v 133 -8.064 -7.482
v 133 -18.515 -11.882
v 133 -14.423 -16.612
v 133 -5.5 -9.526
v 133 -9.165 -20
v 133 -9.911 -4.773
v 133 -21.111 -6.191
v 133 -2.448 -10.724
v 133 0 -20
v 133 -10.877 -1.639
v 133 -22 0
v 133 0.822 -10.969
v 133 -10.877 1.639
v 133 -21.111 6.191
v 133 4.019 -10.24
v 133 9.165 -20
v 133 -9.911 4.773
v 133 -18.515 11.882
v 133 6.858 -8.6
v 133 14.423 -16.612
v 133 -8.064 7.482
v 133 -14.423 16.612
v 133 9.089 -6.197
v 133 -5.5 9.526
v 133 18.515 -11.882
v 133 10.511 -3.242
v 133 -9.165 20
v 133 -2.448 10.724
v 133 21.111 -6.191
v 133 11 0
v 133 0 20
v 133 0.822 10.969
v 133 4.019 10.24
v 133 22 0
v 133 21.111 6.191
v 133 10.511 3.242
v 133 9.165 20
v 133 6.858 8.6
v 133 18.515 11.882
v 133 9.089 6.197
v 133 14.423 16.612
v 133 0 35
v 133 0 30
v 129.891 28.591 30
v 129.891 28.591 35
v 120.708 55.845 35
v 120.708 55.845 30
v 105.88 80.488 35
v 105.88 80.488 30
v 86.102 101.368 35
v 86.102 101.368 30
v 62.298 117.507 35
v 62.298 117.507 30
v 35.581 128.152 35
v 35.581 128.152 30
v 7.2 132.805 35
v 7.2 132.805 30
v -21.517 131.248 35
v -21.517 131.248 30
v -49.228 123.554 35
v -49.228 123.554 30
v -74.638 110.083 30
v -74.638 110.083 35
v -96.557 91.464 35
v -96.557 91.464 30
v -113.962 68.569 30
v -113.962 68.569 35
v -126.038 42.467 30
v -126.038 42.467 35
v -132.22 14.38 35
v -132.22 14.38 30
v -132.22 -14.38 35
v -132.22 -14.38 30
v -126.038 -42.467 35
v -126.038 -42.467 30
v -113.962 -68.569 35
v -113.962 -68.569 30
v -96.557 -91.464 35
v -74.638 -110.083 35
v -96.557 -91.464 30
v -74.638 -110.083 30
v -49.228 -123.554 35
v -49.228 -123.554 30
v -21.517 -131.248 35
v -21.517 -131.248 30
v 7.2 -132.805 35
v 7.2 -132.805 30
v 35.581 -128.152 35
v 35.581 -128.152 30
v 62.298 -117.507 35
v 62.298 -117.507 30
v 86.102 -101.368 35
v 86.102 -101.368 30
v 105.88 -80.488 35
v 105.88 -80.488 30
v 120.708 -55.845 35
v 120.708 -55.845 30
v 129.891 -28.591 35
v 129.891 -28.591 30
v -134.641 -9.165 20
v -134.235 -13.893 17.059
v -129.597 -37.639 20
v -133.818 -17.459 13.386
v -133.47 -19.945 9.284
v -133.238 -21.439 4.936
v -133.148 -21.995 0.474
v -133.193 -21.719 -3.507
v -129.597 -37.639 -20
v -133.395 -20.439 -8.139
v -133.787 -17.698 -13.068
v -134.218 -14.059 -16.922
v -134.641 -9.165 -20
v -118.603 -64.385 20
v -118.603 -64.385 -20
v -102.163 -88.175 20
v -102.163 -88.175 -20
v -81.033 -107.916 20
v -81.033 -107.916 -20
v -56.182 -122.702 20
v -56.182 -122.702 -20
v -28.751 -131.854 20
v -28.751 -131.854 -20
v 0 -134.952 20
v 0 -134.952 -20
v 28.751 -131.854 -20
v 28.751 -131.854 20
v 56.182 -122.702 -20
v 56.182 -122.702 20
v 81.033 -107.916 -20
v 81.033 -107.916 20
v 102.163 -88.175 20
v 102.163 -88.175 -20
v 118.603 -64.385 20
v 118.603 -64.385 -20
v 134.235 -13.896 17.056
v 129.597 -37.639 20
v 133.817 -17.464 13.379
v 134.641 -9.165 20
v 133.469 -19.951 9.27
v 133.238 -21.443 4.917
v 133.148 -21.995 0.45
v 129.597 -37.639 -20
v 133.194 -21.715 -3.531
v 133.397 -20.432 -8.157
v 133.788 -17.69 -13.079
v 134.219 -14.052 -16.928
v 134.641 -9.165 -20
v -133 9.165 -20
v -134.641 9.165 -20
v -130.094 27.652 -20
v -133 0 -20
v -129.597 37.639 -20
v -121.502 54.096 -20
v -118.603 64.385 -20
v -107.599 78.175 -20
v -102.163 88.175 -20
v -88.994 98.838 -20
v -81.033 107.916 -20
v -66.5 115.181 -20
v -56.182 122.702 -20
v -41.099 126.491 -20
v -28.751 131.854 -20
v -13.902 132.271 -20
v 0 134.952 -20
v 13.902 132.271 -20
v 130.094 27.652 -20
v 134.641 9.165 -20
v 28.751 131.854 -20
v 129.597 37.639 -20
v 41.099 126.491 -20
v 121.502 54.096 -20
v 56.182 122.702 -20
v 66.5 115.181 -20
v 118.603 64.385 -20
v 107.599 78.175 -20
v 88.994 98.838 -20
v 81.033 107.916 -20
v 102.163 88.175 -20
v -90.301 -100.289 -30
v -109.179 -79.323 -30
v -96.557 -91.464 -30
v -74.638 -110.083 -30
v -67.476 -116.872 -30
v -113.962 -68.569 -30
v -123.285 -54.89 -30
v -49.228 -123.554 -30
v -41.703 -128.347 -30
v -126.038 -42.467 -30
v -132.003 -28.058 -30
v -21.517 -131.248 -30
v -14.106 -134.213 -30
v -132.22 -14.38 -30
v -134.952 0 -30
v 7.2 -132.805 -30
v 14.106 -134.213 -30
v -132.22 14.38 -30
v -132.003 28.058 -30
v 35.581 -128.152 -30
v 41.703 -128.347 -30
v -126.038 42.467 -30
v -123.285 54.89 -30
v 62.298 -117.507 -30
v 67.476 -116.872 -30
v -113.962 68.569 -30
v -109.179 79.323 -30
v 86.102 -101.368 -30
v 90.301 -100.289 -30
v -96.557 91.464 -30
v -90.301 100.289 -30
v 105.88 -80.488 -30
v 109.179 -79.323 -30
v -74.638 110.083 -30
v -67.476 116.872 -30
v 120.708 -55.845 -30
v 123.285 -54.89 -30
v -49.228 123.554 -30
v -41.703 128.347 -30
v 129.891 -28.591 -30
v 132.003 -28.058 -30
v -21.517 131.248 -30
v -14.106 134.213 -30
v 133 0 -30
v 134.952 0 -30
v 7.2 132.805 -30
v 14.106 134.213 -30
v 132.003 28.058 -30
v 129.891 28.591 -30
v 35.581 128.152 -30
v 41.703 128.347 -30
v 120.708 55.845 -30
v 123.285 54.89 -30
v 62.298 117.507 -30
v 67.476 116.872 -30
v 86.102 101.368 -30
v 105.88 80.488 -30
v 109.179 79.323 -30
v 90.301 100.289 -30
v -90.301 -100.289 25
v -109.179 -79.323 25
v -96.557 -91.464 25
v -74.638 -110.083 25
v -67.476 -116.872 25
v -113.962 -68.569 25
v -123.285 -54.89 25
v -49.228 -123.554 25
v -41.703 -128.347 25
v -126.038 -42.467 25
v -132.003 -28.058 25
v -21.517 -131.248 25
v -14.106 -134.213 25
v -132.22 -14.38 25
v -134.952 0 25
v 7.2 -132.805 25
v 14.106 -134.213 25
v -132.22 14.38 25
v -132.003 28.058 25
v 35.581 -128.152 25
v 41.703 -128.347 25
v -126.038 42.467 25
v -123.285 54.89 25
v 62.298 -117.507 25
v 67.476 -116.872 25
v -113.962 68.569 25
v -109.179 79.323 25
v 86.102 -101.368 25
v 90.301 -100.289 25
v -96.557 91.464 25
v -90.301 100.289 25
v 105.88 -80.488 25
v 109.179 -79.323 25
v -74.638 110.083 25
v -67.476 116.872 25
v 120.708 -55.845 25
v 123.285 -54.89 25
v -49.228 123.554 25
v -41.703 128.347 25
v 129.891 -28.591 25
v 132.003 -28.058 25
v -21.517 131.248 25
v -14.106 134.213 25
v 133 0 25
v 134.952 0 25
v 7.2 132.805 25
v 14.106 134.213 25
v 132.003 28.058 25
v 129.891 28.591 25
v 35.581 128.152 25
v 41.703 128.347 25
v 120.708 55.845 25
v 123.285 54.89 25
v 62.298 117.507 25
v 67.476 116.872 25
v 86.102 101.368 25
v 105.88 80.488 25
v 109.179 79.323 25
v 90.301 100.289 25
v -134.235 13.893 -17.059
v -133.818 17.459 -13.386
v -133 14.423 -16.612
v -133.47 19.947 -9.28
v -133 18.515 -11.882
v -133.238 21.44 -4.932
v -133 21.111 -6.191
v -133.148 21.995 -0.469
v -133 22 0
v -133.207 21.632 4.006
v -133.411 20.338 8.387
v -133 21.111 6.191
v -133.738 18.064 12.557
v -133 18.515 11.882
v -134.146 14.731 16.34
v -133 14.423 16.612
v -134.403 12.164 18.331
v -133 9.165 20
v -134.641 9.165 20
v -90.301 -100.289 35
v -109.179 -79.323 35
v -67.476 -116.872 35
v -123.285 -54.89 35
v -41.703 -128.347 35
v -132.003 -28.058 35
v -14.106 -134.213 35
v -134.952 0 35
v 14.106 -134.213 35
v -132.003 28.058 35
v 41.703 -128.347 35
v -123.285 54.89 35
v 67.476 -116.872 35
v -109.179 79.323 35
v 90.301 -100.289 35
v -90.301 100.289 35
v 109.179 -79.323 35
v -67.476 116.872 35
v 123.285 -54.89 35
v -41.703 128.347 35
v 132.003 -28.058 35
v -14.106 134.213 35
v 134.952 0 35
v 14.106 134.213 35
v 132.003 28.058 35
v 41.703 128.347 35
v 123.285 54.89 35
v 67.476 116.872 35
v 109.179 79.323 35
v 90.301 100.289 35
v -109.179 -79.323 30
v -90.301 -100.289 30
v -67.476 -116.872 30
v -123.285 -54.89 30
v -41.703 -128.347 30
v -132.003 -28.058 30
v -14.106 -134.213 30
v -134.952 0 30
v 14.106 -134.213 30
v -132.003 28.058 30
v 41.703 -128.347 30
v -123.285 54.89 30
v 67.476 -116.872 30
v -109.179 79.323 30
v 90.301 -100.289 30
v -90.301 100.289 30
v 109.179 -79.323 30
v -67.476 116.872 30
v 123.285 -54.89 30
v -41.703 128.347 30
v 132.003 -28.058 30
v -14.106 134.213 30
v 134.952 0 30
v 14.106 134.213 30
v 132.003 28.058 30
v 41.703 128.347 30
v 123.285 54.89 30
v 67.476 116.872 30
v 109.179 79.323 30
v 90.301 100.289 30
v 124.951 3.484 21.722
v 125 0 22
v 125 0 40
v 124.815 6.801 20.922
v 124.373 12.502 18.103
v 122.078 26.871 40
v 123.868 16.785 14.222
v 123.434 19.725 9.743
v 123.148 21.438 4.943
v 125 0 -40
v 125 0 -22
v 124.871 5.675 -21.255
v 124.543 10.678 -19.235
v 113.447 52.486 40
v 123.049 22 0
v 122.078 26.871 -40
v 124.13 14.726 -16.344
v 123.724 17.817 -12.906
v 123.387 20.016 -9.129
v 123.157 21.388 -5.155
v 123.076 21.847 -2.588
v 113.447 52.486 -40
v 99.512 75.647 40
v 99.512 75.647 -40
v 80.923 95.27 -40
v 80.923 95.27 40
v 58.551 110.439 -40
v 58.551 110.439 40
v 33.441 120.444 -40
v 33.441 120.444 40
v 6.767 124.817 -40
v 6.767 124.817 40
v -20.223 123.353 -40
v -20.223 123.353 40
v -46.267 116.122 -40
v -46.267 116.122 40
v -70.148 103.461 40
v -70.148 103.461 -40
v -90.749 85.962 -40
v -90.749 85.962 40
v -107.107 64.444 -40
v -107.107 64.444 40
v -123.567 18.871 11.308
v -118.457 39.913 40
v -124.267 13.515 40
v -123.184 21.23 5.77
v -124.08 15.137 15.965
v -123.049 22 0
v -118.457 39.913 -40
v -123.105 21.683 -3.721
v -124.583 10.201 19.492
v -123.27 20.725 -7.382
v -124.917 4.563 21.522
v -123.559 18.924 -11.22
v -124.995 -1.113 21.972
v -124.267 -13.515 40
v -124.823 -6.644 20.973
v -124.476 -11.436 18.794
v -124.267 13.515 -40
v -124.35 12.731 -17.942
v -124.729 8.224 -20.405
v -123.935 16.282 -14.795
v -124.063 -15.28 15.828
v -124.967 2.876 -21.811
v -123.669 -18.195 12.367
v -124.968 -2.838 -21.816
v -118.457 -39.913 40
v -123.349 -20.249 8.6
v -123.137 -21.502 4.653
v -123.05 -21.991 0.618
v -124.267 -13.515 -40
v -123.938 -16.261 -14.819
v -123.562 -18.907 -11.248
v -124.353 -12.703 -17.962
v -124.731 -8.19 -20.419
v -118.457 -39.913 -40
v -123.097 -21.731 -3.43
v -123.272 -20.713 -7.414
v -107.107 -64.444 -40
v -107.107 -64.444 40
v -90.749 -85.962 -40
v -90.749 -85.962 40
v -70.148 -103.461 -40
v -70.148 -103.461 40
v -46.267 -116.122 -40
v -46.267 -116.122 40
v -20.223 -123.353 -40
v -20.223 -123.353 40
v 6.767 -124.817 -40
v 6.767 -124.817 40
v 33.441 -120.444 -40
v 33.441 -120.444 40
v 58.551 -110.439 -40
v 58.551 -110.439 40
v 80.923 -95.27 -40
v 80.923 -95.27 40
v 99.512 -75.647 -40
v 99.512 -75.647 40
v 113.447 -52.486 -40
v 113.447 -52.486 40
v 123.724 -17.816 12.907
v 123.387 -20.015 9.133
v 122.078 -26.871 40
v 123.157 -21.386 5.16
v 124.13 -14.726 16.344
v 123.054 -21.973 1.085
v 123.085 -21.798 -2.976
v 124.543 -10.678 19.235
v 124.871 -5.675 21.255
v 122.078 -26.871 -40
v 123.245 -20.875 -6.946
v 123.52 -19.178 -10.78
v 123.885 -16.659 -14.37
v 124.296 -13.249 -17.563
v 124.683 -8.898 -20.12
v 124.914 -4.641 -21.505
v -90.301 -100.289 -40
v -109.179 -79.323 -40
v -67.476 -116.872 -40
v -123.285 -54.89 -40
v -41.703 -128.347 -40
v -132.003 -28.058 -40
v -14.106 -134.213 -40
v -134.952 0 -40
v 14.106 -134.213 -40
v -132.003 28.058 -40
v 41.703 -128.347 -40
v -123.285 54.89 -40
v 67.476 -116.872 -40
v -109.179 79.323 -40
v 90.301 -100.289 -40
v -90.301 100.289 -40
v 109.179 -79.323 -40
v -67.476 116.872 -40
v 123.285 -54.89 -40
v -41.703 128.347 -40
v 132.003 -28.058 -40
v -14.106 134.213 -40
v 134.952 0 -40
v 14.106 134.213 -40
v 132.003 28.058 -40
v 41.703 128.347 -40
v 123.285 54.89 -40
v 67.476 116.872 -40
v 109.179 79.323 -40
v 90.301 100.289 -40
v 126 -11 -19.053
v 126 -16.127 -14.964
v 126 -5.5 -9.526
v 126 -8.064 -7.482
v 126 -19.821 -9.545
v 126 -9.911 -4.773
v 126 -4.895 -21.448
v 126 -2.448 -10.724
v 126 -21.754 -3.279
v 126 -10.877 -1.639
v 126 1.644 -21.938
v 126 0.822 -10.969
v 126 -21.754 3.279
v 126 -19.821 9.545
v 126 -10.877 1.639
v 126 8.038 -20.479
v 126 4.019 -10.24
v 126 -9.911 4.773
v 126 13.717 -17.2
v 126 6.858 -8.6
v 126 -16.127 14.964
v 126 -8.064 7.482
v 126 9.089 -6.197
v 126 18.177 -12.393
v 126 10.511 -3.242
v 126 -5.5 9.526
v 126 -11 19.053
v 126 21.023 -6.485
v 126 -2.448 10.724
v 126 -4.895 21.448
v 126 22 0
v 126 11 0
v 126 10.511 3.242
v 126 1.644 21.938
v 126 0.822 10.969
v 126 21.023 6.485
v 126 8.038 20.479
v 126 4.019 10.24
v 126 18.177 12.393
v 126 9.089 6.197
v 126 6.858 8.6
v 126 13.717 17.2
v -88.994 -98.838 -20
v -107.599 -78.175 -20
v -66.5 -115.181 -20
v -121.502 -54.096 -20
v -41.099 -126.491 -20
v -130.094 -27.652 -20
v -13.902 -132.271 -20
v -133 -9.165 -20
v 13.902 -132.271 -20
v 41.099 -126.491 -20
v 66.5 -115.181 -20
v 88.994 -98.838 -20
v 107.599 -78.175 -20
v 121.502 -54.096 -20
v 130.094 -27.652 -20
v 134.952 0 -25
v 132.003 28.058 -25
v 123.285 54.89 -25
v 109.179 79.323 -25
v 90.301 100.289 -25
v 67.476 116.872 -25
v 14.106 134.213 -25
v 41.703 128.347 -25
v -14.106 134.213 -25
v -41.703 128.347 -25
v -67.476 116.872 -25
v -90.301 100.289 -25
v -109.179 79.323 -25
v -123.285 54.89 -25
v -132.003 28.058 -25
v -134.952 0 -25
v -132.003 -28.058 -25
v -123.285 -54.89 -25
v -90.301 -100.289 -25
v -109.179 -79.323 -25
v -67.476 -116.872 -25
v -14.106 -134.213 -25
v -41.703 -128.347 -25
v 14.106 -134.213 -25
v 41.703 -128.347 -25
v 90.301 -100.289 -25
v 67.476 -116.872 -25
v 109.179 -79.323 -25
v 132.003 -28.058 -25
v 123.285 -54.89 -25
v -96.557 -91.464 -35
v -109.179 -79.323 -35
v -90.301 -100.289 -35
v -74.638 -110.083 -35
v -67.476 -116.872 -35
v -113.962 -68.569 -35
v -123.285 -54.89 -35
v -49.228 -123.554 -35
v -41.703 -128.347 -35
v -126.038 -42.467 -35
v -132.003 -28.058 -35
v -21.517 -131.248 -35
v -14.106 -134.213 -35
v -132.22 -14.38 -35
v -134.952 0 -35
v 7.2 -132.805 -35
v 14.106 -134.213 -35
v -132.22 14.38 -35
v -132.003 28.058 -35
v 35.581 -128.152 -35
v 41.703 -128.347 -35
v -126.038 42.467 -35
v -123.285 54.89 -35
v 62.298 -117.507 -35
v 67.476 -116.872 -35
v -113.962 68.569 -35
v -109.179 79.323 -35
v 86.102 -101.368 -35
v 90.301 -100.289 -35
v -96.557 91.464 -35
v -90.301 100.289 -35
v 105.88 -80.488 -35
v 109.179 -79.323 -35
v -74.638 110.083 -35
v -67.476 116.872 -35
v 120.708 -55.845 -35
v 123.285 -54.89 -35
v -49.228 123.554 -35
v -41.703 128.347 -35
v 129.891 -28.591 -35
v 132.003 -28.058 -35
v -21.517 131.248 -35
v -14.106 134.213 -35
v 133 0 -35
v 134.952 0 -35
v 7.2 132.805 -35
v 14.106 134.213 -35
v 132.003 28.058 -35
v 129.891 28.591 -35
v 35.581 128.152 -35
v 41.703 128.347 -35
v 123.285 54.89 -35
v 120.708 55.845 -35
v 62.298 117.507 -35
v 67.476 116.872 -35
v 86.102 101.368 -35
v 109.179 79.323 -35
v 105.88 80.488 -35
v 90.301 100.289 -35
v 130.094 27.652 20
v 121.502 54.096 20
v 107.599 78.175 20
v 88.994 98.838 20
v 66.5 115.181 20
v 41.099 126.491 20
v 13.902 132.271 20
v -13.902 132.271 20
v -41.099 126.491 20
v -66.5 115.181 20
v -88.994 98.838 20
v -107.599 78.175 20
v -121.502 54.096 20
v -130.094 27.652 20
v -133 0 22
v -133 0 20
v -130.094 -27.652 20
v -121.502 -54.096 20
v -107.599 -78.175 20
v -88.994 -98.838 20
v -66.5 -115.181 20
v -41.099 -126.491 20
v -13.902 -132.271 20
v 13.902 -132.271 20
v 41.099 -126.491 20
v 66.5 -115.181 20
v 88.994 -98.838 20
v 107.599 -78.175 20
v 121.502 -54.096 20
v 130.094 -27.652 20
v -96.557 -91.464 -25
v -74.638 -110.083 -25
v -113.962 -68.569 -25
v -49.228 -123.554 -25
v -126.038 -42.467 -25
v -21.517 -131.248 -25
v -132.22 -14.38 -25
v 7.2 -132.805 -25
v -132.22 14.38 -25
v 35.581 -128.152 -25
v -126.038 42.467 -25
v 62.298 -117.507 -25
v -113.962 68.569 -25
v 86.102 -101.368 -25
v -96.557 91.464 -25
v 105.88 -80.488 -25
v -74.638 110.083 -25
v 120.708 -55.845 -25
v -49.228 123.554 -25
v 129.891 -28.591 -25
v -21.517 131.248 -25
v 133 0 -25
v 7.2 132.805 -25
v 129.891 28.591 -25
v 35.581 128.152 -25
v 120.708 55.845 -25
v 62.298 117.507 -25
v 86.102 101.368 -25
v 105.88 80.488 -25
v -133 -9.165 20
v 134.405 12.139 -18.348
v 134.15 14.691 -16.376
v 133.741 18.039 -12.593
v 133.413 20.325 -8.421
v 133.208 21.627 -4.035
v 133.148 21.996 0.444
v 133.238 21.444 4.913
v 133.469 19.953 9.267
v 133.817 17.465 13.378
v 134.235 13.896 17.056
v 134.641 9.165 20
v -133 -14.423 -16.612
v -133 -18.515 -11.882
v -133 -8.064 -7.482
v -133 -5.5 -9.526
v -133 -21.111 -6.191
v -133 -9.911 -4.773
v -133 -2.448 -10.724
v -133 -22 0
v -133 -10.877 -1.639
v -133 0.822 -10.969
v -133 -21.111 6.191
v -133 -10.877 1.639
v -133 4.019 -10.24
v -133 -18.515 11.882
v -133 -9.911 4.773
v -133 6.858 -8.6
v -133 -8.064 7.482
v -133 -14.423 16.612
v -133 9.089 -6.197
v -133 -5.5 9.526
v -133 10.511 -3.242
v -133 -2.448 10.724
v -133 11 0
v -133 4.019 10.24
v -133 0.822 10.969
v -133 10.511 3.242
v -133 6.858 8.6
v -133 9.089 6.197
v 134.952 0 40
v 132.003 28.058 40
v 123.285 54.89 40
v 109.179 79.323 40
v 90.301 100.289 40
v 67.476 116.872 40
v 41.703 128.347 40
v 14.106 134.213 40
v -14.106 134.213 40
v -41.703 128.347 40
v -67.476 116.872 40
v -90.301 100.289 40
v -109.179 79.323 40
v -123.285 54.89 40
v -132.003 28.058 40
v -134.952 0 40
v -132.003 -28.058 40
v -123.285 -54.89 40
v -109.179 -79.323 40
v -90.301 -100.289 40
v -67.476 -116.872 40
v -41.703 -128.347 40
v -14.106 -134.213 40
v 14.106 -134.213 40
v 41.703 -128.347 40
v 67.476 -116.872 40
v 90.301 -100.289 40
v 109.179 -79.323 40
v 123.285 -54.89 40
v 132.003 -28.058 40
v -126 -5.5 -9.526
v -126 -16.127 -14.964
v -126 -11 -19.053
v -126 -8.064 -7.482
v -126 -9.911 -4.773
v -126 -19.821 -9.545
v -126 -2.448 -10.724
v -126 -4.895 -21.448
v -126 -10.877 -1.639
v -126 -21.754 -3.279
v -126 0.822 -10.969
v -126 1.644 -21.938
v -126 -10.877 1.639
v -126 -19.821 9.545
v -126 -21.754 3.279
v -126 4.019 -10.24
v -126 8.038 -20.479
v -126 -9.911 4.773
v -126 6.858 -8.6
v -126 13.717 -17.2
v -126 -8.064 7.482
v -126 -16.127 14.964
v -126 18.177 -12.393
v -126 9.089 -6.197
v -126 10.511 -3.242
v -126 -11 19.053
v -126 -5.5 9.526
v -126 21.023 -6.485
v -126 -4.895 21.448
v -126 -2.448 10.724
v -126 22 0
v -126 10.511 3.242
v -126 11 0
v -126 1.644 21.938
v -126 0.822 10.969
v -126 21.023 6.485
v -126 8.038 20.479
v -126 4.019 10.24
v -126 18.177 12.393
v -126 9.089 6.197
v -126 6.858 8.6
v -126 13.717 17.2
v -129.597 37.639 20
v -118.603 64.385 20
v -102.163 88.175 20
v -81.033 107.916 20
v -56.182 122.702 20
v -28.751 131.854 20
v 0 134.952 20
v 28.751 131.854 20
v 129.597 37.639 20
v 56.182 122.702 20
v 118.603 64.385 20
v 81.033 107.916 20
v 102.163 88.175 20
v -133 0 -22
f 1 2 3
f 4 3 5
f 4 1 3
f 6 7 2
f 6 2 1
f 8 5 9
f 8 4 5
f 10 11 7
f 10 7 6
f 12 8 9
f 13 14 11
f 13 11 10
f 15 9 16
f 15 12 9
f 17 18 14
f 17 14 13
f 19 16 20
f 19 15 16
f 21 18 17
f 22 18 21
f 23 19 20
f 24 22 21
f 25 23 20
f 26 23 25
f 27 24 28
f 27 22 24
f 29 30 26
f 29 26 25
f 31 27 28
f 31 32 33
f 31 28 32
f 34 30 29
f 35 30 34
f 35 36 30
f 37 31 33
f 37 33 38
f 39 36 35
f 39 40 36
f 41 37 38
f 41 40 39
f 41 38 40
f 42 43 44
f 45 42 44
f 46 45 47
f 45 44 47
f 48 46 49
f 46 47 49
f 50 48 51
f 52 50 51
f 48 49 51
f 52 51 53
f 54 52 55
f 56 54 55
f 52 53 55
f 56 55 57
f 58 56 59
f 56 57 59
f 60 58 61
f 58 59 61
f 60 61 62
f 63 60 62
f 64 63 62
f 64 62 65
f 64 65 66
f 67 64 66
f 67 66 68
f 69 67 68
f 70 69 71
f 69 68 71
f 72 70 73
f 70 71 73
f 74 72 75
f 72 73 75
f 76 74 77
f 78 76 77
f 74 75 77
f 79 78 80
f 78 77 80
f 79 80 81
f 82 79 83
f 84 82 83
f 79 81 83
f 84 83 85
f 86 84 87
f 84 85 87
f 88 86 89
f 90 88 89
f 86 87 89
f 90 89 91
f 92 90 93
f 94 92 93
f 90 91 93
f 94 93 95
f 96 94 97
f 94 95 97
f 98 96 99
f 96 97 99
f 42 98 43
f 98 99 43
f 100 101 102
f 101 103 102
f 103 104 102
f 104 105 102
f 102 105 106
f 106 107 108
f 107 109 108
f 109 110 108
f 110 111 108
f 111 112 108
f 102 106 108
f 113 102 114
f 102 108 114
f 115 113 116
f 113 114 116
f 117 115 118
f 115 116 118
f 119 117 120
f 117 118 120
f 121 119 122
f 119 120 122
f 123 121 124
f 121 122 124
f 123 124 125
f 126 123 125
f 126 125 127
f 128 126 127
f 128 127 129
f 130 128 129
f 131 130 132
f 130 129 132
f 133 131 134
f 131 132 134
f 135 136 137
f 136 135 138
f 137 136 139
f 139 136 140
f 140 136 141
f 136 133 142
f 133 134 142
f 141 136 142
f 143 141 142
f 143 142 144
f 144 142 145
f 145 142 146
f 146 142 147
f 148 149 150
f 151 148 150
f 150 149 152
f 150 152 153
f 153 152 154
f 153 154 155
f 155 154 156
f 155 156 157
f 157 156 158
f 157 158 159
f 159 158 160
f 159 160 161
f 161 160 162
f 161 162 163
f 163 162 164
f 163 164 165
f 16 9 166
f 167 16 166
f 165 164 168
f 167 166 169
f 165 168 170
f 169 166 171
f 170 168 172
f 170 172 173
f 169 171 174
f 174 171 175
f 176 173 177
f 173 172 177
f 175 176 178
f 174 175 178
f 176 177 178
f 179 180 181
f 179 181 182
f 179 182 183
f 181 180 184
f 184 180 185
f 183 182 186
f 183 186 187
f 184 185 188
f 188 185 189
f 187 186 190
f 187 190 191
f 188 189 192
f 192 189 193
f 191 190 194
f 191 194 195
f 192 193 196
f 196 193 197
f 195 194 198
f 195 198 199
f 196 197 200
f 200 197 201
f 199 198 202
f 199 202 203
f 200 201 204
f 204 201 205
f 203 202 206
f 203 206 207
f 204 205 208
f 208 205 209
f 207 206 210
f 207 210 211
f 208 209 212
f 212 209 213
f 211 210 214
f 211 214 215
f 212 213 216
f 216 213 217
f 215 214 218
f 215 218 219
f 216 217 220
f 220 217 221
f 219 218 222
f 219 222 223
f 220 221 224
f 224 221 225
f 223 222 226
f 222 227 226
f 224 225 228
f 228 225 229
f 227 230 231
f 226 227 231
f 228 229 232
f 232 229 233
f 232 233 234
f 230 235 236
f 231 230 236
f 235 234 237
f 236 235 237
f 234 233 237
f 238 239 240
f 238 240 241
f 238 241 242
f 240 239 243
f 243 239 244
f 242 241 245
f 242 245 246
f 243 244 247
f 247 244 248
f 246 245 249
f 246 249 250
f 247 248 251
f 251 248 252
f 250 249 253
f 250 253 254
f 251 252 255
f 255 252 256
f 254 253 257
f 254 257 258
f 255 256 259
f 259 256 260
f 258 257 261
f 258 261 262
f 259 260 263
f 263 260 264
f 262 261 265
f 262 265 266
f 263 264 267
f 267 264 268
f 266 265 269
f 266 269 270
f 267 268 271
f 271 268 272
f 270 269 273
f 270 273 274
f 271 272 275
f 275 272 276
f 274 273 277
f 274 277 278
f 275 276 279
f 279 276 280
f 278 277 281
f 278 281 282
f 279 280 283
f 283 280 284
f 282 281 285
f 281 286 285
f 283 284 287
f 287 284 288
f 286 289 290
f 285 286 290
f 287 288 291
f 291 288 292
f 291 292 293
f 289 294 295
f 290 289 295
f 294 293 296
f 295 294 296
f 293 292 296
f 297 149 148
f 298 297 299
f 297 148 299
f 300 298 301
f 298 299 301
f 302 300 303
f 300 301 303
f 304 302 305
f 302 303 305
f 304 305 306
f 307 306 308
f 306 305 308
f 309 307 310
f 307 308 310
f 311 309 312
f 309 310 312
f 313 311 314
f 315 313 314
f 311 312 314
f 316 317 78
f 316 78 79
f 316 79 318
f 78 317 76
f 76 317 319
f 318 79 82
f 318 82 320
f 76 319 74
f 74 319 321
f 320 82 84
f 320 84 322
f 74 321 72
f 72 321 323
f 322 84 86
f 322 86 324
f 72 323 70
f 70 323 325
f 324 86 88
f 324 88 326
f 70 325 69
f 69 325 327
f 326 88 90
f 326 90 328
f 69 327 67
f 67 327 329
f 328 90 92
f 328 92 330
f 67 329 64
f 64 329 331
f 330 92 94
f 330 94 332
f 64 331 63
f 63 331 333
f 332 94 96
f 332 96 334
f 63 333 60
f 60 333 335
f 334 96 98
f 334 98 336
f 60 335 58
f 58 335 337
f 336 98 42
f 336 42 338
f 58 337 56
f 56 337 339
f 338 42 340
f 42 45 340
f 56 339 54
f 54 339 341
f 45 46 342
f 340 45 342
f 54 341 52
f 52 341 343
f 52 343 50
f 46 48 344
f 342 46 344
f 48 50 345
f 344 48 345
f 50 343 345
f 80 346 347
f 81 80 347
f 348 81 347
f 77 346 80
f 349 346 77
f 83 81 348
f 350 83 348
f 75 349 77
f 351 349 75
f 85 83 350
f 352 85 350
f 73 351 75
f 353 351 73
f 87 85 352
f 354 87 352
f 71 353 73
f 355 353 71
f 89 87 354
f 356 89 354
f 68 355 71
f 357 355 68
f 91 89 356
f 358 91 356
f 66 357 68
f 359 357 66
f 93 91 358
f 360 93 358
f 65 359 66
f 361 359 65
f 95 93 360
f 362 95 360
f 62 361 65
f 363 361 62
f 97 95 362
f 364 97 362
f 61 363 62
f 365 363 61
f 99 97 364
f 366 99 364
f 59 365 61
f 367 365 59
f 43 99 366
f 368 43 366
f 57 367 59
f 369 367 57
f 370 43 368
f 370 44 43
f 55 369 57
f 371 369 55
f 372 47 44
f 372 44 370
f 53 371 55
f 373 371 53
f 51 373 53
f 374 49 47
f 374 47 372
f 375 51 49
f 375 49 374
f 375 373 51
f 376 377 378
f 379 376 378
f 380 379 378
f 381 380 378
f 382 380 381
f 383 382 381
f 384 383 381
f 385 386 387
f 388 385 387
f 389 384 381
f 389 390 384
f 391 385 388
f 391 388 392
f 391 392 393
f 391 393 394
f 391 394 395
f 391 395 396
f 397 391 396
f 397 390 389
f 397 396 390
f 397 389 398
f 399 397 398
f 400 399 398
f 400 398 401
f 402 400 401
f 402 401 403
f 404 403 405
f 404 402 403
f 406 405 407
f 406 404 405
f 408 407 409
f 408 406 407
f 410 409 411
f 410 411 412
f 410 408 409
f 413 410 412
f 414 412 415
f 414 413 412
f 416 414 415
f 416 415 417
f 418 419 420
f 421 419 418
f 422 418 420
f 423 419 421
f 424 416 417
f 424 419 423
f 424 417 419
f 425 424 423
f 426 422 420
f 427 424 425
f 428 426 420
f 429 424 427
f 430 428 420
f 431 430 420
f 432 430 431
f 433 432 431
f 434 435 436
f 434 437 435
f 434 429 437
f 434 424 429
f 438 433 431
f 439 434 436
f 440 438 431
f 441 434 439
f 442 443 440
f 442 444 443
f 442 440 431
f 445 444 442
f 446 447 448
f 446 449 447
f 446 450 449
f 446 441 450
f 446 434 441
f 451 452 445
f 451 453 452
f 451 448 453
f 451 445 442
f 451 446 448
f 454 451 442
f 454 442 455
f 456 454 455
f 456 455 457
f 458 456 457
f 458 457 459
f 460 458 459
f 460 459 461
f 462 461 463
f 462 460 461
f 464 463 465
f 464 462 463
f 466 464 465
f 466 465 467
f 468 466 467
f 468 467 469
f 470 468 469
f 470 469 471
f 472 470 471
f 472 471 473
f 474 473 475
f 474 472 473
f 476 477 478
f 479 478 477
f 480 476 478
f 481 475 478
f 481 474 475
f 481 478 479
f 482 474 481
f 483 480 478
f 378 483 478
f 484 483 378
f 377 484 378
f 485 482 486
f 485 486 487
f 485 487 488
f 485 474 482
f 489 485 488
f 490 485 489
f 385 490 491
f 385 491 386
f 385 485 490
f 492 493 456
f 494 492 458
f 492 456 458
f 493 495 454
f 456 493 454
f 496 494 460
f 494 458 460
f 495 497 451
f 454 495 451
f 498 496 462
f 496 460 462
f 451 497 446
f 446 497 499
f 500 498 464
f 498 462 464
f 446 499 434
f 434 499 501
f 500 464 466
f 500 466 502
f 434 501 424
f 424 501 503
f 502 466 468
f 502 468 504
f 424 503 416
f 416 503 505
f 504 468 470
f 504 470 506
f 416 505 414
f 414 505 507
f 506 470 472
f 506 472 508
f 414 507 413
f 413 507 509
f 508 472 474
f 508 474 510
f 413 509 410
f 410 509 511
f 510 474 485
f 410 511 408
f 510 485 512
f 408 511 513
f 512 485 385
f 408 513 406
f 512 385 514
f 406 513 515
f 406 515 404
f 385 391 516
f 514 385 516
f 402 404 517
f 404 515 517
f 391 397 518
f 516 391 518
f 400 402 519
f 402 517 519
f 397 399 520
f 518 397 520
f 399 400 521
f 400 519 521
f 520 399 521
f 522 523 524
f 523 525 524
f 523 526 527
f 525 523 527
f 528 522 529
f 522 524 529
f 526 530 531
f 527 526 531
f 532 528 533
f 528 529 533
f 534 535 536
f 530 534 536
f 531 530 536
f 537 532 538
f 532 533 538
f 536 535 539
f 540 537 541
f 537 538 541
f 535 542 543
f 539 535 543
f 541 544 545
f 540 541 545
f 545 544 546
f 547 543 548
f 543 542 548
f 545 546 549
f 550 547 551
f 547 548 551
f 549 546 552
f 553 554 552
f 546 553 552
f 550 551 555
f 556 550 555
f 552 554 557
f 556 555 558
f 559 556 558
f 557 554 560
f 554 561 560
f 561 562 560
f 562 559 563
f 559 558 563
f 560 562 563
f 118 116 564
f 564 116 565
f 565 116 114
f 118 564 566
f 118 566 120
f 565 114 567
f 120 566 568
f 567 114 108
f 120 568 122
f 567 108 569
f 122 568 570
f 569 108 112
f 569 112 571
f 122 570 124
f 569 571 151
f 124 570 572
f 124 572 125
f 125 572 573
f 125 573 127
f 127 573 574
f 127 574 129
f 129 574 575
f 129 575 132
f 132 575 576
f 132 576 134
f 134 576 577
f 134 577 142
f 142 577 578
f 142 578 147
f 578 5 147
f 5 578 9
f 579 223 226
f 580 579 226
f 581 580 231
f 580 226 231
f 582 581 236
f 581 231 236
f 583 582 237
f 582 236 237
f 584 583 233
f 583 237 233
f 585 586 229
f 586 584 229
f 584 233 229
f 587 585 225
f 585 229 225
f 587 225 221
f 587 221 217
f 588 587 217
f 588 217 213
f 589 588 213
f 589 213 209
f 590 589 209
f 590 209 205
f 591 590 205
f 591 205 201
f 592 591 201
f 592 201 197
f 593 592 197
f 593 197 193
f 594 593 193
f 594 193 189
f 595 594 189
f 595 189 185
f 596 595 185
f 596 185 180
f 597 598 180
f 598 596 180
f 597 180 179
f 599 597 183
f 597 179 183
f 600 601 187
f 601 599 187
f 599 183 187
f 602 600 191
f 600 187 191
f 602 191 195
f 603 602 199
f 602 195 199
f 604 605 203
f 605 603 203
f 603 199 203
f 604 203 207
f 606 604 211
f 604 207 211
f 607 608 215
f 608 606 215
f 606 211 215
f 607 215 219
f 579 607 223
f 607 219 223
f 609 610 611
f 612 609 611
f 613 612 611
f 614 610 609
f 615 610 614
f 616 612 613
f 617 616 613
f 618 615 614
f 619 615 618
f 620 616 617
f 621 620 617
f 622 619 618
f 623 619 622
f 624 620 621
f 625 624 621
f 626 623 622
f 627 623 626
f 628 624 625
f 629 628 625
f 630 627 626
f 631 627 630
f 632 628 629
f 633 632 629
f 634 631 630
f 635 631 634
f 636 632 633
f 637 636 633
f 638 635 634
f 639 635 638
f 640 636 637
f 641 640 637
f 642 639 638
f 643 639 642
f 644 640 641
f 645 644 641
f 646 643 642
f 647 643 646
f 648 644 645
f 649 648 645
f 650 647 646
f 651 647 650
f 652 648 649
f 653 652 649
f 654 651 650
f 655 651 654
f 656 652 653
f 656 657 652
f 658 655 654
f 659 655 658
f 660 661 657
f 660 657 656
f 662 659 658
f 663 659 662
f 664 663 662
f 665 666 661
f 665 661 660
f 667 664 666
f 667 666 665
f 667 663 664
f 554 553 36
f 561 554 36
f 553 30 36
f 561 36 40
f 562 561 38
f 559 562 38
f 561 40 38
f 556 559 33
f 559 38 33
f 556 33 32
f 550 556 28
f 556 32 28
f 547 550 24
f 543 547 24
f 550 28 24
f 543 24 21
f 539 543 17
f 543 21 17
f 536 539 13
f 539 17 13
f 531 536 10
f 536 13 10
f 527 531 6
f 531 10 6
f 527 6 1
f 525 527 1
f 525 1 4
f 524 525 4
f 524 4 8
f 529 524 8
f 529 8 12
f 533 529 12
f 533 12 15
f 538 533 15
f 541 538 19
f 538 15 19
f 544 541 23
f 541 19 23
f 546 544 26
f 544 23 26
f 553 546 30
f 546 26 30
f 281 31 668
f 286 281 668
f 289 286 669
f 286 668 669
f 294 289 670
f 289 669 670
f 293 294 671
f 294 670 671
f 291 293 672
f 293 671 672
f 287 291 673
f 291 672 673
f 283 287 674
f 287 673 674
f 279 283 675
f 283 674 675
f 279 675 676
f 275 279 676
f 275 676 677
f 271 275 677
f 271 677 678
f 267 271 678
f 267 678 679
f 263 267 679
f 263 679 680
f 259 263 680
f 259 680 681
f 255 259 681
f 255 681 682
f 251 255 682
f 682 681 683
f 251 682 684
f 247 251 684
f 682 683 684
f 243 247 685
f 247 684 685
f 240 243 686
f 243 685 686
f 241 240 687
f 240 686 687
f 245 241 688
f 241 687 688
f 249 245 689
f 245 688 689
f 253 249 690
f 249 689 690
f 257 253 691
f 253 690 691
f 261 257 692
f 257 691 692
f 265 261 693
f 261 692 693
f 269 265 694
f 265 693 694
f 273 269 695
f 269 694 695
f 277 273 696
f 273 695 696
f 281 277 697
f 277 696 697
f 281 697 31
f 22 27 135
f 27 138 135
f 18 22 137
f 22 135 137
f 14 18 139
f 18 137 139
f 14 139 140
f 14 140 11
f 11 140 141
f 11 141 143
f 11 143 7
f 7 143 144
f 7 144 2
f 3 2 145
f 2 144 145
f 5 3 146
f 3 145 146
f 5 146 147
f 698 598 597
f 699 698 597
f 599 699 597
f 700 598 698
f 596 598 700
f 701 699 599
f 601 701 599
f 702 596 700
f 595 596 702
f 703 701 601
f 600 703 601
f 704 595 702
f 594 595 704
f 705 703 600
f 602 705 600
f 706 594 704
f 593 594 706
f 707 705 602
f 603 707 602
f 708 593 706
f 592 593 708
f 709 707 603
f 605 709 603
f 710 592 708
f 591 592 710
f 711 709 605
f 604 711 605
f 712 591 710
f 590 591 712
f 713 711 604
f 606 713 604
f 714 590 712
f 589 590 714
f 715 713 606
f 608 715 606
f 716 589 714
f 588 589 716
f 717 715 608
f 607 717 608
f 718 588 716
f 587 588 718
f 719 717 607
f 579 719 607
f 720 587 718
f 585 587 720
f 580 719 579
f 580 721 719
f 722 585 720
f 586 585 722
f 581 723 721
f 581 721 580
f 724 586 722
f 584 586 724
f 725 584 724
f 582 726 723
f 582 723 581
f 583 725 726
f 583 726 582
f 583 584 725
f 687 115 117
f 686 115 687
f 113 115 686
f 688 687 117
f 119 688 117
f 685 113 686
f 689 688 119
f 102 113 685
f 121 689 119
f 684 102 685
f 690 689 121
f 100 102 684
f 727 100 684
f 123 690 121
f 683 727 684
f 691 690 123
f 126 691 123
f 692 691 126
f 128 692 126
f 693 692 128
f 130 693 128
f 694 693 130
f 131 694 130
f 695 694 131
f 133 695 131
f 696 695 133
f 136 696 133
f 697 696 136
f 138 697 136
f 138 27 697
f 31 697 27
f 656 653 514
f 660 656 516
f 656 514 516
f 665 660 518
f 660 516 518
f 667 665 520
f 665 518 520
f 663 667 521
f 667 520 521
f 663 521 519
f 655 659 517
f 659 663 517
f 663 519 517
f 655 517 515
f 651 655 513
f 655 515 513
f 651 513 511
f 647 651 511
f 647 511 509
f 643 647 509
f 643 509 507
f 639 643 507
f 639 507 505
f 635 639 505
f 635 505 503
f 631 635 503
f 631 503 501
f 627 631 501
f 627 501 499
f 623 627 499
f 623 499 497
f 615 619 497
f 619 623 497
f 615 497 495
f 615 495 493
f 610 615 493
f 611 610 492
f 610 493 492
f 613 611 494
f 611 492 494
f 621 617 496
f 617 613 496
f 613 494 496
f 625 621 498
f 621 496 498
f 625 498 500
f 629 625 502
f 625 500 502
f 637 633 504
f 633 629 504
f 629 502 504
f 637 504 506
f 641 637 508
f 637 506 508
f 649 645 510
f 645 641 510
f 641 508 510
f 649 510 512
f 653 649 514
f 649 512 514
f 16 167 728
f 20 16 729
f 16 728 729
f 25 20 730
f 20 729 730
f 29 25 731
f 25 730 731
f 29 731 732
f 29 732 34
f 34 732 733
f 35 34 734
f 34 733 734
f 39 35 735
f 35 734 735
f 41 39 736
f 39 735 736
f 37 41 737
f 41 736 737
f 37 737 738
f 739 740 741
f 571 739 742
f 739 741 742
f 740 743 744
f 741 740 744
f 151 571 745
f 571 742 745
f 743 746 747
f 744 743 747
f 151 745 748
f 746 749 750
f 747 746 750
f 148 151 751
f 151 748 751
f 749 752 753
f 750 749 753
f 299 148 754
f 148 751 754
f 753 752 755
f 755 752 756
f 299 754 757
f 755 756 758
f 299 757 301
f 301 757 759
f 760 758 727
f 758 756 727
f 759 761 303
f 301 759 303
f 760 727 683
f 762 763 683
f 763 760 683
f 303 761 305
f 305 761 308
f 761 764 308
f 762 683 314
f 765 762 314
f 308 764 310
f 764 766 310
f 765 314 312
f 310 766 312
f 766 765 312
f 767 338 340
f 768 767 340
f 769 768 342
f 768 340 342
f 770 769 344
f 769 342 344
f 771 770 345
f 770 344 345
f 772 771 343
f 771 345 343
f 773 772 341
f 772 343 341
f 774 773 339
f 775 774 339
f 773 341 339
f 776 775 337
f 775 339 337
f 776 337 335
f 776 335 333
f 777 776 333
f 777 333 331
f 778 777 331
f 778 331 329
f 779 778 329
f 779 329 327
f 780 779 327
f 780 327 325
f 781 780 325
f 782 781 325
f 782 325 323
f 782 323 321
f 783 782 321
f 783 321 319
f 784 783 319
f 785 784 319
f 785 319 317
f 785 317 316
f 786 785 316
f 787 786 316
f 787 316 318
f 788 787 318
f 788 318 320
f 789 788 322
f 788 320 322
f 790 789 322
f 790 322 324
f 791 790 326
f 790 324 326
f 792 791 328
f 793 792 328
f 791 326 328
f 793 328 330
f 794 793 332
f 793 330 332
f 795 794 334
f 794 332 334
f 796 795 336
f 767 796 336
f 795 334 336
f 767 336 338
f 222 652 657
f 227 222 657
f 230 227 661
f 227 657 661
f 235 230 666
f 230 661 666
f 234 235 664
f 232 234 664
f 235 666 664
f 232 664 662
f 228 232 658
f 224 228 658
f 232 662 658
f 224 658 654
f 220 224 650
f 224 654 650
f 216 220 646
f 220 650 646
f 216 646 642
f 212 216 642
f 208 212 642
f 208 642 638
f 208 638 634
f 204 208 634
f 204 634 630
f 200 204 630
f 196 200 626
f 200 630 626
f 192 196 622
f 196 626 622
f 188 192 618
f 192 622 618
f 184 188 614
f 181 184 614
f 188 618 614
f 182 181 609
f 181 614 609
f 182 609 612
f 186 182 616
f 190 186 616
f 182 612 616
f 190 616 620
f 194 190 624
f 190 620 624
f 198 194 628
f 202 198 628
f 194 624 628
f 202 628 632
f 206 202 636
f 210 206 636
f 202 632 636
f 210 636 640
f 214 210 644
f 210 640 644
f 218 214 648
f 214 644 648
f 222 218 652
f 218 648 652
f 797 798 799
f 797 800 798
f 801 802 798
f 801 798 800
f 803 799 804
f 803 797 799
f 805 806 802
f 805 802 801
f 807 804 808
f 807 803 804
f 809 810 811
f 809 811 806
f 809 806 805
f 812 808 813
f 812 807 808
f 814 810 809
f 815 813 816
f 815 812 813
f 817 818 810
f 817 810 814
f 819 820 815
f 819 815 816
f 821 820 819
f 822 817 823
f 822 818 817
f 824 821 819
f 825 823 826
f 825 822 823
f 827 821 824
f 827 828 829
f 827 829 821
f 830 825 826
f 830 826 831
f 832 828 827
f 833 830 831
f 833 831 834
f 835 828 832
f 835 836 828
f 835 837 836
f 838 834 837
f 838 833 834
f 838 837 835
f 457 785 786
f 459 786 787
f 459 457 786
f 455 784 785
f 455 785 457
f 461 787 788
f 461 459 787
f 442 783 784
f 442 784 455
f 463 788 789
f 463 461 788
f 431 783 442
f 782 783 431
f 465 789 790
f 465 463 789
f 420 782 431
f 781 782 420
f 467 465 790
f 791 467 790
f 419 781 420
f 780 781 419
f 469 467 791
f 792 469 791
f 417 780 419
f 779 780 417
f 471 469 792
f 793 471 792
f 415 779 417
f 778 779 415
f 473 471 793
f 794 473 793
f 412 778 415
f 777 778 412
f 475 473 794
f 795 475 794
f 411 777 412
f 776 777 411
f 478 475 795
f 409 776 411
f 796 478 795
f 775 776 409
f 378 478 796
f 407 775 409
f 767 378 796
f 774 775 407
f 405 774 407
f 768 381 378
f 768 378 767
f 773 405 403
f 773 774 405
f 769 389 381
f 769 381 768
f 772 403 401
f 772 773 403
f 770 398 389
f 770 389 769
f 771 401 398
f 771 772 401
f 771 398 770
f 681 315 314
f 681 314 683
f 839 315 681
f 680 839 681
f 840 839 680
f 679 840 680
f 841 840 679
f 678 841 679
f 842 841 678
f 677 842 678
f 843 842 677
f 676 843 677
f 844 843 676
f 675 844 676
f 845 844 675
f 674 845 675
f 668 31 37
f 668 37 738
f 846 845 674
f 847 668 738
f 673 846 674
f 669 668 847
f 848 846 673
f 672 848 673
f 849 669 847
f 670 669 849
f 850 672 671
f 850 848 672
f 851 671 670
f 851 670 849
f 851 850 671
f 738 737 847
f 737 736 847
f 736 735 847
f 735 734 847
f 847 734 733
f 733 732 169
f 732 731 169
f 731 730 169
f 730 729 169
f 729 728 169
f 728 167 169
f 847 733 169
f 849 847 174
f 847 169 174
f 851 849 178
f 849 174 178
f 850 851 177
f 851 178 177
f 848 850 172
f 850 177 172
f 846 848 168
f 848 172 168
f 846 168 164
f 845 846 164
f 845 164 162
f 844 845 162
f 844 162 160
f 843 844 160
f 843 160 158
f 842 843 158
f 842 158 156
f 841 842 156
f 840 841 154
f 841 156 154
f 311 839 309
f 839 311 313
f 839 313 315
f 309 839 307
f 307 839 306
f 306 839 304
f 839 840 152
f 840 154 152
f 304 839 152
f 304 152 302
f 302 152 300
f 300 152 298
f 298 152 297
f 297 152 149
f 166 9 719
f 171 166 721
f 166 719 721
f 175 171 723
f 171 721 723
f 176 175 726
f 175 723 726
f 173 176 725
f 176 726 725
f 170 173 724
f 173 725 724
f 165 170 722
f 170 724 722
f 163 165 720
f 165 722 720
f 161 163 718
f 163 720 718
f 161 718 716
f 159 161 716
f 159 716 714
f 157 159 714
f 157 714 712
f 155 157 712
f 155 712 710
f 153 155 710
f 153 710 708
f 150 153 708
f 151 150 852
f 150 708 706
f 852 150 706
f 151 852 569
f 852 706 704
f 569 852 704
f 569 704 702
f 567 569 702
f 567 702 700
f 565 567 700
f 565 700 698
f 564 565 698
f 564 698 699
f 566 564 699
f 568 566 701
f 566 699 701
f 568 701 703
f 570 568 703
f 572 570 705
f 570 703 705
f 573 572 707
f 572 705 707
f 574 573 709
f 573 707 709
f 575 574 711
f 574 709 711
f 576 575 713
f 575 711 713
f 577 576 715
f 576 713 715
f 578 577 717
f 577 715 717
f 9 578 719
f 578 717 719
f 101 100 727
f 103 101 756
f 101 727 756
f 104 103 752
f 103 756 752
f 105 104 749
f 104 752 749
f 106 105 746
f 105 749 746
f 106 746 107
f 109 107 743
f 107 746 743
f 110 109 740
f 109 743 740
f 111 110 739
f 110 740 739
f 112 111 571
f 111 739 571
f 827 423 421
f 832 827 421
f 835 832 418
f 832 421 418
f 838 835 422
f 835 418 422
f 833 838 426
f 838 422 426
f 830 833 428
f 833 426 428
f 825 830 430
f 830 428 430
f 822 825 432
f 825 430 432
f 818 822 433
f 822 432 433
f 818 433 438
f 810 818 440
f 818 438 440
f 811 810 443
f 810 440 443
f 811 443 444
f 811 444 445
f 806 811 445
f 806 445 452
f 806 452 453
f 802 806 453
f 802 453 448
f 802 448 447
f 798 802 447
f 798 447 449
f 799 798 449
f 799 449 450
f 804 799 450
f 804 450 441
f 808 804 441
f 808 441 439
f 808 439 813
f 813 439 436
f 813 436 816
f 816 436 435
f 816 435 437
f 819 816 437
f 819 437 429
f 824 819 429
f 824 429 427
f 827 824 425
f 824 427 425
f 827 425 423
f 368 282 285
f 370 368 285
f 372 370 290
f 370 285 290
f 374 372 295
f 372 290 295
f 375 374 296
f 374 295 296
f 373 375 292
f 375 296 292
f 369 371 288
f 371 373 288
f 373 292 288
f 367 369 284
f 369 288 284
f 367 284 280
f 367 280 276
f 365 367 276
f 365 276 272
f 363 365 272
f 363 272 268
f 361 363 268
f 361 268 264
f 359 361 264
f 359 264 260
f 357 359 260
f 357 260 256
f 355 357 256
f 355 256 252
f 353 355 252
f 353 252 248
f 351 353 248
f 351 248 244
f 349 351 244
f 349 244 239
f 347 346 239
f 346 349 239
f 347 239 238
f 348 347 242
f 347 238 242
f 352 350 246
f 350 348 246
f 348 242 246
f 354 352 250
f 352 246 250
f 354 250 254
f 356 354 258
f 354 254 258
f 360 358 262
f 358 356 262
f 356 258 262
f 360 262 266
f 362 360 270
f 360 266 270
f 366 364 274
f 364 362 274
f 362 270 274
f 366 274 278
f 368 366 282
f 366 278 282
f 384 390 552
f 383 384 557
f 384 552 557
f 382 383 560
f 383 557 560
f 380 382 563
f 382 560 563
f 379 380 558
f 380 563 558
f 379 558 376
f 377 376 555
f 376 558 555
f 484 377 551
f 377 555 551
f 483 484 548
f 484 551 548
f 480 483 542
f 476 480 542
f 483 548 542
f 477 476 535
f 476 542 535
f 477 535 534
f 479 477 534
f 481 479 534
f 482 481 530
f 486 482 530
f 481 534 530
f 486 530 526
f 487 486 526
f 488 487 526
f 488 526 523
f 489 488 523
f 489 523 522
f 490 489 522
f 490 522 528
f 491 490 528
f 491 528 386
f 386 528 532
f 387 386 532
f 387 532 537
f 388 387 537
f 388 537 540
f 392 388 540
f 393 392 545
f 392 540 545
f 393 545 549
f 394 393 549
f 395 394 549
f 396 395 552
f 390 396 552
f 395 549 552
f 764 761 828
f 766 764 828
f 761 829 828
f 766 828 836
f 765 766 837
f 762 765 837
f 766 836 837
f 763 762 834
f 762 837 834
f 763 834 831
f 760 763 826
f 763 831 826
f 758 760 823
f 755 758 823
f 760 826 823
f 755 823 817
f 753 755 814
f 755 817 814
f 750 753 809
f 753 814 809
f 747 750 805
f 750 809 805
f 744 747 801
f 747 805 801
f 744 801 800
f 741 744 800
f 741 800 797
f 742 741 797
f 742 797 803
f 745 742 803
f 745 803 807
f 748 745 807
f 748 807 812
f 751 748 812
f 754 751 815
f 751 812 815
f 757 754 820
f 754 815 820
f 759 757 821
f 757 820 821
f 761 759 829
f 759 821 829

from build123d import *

# Parameters (mm, degrees)
SKETCH005_R      = 140.350312
SKETCH005_R_2    = 133
EXTRUDE011_DEPTH = 5
EXTRUDE010_DEPTH = 5
EXTRUDE008_DEPTH = 5
EXTRUDE009_DEPTH = 5
SKETCH004_R      = 157.293563
EXTRUDE007_DEPTH = 50
SKETCH003_R      = 22
EXTRUDE004_DEPTH = 10
EXTRUDE005_DEPTH = 10
EXTRUDE006_DEPTH = 10
EXTRUDE002_DEPTH = 10
SKETCH002_R      = 11
EXTRUDE_DEPTH    = 150
SKETCH_R         = 134.952227
SKETCH_R_2       = 125
EXTRUDE001_DEPTH = 80


with BuildPart() as extrude011:
    # Sketch005 → Extrude011 (new body)
    with BuildSketch(Plane.XY):
        Circle(SKETCH005_R)
        Circle(SKETCH005_R_2, mode=Mode.SUBTRACT)
    extrude(amount=EXTRUDE011_DEPTH)


with BuildPart() as extrude011_1:
    # Extrude011 placement: moved
    add(extrude011.part.moved(Location((0, 0, -35))))


with BuildPart() as extrude010:
    # Sketch005 → Extrude010 (new body)
    with BuildSketch(Plane.XY):
        Circle(SKETCH005_R)
        Circle(SKETCH005_R_2, mode=Mode.SUBTRACT)
    extrude(amount=EXTRUDE010_DEPTH)


with BuildPart() as extrude010_1:
    # Extrude010 placement: moved
    add(extrude010.part.moved(Location((0, 0, -25))))


with BuildPart() as extrude008:
    # Sketch005 → Extrude008 (new body)
    with BuildSketch(Plane.XY):
        Circle(SKETCH005_R)
        Circle(SKETCH005_R_2, mode=Mode.SUBTRACT)
    extrude(amount=EXTRUDE008_DEPTH)


with BuildPart() as extrude008_1:
    # Extrude008 placement: moved
    add(extrude008.part.moved(Location((0, 0, 20))))


with BuildPart() as extrude009:
    # Sketch005 → Extrude009 (new body)
    with BuildSketch(Plane.XY):
        Circle(SKETCH005_R)
        Circle(SKETCH005_R_2, mode=Mode.SUBTRACT)
    extrude(amount=EXTRUDE009_DEPTH)


with BuildPart() as extrude009_1:
    # Extrude009 placement: moved
    add(extrude009.part.moved(Location((0, 0, 30))))


with BuildPart() as extrude007:
    # Sketch004 → Extrude007 (new body)
    with BuildSketch(Plane.XY):
        Circle(SKETCH004_R)
    extrude(amount=EXTRUDE007_DEPTH)


with BuildPart() as extrude007_1:
    # Extrude007 placement: moved
    add(extrude007.part.moved(Location((0, 0, 51))))


with BuildPart() as extrude004:
    # Sketch003 (on Face3 of Extrude) → Extrude004 (new body)
    with BuildSketch(Plane.YZ.offset(150)):
        Circle(SKETCH003_R)
    extrude(amount=-EXTRUDE004_DEPTH)


with BuildPart() as extrude004_1:
    # Extrude004 placement: moved
    add(extrude004.part.moved(Location((-283, 0, 0))))


with BuildPart() as extrude005:
    # Sketch003 (on Face3 of Extrude) → Extrude005 (new body)
    with BuildSketch(Plane.YZ.offset(150)):
        Circle(SKETCH003_R)
    extrude(amount=-EXTRUDE005_DEPTH)


with BuildPart() as extrude005_1:
    # Extrude005 placement: moved
    add(extrude005.part.moved(Location((-266, 0, 0))))


with BuildPart() as extrude006:
    # Sketch003 (on Face3 of Extrude) → Extrude006 (new body)
    with BuildSketch(Plane.YZ.offset(150)):
        Circle(SKETCH003_R)
    extrude(amount=-EXTRUDE006_DEPTH)


with BuildPart() as extrude006_1:
    # Extrude006 placement: moved
    add(extrude006.part.moved(Location((-24, 0, 0))))


with BuildPart() as extrude002:
    # Sketch003 (on Face3 of Extrude) → Extrude002 (new body)
    with BuildSketch(Plane.YZ.offset(150)):
        Circle(SKETCH003_R)
    extrude(amount=-EXTRUDE002_DEPTH)


with BuildPart() as extrude002_1:
    # Extrude002 placement: moved
    add(extrude002.part.moved(Location((-7, 0, 0))))


with BuildPart() as extrude_body:
    # Sketch002 → Extrude (new body, symmetric)
    with BuildSketch(Plane.YZ):
        Circle(SKETCH002_R)
    extrude(amount=EXTRUDE_DEPTH, both=True)


with BuildPart() as cut009:
    # Sketch → Extrude001 (new body)
    with BuildSketch(Plane.XY):
        Circle(SKETCH_R)
        Circle(SKETCH_R_2, mode=Mode.SUBTRACT)
    extrude(amount=EXTRUDE001_DEPTH)


with BuildPart() as cut009_1:
    # Extrude001 placement: moved
    add(cut009.part.moved(Location((0, 0, -40))))

    # Cut: cut Extrude body
    add(extrude_body.part, mode=Mode.SUBTRACT)

    # Cut001: cut Extrude002
    add(extrude002_1.part, mode=Mode.SUBTRACT)

    # Cut002: cut Extrude006
    add(extrude006_1.part, mode=Mode.SUBTRACT)

    # Cut003: cut Extrude005
    add(extrude005_1.part, mode=Mode.SUBTRACT)

    # Cut004: cut Extrude004
    add(extrude004_1.part, mode=Mode.SUBTRACT)

    # Cut005: cut Extrude007
    add(extrude007_1.part, mode=Mode.SUBTRACT)

    # Cut006: cut Extrude009
    add(extrude009_1.part, mode=Mode.SUBTRACT)

    # Cut007: cut Extrude008
    add(extrude008_1.part, mode=Mode.SUBTRACT)

    # Cut008: cut Extrude010
    add(extrude010_1.part, mode=Mode.SUBTRACT)

    # Cut009: cut Extrude011
    add(extrude011_1.part, mode=Mode.SUBTRACT)


solid = cut009_1.part
